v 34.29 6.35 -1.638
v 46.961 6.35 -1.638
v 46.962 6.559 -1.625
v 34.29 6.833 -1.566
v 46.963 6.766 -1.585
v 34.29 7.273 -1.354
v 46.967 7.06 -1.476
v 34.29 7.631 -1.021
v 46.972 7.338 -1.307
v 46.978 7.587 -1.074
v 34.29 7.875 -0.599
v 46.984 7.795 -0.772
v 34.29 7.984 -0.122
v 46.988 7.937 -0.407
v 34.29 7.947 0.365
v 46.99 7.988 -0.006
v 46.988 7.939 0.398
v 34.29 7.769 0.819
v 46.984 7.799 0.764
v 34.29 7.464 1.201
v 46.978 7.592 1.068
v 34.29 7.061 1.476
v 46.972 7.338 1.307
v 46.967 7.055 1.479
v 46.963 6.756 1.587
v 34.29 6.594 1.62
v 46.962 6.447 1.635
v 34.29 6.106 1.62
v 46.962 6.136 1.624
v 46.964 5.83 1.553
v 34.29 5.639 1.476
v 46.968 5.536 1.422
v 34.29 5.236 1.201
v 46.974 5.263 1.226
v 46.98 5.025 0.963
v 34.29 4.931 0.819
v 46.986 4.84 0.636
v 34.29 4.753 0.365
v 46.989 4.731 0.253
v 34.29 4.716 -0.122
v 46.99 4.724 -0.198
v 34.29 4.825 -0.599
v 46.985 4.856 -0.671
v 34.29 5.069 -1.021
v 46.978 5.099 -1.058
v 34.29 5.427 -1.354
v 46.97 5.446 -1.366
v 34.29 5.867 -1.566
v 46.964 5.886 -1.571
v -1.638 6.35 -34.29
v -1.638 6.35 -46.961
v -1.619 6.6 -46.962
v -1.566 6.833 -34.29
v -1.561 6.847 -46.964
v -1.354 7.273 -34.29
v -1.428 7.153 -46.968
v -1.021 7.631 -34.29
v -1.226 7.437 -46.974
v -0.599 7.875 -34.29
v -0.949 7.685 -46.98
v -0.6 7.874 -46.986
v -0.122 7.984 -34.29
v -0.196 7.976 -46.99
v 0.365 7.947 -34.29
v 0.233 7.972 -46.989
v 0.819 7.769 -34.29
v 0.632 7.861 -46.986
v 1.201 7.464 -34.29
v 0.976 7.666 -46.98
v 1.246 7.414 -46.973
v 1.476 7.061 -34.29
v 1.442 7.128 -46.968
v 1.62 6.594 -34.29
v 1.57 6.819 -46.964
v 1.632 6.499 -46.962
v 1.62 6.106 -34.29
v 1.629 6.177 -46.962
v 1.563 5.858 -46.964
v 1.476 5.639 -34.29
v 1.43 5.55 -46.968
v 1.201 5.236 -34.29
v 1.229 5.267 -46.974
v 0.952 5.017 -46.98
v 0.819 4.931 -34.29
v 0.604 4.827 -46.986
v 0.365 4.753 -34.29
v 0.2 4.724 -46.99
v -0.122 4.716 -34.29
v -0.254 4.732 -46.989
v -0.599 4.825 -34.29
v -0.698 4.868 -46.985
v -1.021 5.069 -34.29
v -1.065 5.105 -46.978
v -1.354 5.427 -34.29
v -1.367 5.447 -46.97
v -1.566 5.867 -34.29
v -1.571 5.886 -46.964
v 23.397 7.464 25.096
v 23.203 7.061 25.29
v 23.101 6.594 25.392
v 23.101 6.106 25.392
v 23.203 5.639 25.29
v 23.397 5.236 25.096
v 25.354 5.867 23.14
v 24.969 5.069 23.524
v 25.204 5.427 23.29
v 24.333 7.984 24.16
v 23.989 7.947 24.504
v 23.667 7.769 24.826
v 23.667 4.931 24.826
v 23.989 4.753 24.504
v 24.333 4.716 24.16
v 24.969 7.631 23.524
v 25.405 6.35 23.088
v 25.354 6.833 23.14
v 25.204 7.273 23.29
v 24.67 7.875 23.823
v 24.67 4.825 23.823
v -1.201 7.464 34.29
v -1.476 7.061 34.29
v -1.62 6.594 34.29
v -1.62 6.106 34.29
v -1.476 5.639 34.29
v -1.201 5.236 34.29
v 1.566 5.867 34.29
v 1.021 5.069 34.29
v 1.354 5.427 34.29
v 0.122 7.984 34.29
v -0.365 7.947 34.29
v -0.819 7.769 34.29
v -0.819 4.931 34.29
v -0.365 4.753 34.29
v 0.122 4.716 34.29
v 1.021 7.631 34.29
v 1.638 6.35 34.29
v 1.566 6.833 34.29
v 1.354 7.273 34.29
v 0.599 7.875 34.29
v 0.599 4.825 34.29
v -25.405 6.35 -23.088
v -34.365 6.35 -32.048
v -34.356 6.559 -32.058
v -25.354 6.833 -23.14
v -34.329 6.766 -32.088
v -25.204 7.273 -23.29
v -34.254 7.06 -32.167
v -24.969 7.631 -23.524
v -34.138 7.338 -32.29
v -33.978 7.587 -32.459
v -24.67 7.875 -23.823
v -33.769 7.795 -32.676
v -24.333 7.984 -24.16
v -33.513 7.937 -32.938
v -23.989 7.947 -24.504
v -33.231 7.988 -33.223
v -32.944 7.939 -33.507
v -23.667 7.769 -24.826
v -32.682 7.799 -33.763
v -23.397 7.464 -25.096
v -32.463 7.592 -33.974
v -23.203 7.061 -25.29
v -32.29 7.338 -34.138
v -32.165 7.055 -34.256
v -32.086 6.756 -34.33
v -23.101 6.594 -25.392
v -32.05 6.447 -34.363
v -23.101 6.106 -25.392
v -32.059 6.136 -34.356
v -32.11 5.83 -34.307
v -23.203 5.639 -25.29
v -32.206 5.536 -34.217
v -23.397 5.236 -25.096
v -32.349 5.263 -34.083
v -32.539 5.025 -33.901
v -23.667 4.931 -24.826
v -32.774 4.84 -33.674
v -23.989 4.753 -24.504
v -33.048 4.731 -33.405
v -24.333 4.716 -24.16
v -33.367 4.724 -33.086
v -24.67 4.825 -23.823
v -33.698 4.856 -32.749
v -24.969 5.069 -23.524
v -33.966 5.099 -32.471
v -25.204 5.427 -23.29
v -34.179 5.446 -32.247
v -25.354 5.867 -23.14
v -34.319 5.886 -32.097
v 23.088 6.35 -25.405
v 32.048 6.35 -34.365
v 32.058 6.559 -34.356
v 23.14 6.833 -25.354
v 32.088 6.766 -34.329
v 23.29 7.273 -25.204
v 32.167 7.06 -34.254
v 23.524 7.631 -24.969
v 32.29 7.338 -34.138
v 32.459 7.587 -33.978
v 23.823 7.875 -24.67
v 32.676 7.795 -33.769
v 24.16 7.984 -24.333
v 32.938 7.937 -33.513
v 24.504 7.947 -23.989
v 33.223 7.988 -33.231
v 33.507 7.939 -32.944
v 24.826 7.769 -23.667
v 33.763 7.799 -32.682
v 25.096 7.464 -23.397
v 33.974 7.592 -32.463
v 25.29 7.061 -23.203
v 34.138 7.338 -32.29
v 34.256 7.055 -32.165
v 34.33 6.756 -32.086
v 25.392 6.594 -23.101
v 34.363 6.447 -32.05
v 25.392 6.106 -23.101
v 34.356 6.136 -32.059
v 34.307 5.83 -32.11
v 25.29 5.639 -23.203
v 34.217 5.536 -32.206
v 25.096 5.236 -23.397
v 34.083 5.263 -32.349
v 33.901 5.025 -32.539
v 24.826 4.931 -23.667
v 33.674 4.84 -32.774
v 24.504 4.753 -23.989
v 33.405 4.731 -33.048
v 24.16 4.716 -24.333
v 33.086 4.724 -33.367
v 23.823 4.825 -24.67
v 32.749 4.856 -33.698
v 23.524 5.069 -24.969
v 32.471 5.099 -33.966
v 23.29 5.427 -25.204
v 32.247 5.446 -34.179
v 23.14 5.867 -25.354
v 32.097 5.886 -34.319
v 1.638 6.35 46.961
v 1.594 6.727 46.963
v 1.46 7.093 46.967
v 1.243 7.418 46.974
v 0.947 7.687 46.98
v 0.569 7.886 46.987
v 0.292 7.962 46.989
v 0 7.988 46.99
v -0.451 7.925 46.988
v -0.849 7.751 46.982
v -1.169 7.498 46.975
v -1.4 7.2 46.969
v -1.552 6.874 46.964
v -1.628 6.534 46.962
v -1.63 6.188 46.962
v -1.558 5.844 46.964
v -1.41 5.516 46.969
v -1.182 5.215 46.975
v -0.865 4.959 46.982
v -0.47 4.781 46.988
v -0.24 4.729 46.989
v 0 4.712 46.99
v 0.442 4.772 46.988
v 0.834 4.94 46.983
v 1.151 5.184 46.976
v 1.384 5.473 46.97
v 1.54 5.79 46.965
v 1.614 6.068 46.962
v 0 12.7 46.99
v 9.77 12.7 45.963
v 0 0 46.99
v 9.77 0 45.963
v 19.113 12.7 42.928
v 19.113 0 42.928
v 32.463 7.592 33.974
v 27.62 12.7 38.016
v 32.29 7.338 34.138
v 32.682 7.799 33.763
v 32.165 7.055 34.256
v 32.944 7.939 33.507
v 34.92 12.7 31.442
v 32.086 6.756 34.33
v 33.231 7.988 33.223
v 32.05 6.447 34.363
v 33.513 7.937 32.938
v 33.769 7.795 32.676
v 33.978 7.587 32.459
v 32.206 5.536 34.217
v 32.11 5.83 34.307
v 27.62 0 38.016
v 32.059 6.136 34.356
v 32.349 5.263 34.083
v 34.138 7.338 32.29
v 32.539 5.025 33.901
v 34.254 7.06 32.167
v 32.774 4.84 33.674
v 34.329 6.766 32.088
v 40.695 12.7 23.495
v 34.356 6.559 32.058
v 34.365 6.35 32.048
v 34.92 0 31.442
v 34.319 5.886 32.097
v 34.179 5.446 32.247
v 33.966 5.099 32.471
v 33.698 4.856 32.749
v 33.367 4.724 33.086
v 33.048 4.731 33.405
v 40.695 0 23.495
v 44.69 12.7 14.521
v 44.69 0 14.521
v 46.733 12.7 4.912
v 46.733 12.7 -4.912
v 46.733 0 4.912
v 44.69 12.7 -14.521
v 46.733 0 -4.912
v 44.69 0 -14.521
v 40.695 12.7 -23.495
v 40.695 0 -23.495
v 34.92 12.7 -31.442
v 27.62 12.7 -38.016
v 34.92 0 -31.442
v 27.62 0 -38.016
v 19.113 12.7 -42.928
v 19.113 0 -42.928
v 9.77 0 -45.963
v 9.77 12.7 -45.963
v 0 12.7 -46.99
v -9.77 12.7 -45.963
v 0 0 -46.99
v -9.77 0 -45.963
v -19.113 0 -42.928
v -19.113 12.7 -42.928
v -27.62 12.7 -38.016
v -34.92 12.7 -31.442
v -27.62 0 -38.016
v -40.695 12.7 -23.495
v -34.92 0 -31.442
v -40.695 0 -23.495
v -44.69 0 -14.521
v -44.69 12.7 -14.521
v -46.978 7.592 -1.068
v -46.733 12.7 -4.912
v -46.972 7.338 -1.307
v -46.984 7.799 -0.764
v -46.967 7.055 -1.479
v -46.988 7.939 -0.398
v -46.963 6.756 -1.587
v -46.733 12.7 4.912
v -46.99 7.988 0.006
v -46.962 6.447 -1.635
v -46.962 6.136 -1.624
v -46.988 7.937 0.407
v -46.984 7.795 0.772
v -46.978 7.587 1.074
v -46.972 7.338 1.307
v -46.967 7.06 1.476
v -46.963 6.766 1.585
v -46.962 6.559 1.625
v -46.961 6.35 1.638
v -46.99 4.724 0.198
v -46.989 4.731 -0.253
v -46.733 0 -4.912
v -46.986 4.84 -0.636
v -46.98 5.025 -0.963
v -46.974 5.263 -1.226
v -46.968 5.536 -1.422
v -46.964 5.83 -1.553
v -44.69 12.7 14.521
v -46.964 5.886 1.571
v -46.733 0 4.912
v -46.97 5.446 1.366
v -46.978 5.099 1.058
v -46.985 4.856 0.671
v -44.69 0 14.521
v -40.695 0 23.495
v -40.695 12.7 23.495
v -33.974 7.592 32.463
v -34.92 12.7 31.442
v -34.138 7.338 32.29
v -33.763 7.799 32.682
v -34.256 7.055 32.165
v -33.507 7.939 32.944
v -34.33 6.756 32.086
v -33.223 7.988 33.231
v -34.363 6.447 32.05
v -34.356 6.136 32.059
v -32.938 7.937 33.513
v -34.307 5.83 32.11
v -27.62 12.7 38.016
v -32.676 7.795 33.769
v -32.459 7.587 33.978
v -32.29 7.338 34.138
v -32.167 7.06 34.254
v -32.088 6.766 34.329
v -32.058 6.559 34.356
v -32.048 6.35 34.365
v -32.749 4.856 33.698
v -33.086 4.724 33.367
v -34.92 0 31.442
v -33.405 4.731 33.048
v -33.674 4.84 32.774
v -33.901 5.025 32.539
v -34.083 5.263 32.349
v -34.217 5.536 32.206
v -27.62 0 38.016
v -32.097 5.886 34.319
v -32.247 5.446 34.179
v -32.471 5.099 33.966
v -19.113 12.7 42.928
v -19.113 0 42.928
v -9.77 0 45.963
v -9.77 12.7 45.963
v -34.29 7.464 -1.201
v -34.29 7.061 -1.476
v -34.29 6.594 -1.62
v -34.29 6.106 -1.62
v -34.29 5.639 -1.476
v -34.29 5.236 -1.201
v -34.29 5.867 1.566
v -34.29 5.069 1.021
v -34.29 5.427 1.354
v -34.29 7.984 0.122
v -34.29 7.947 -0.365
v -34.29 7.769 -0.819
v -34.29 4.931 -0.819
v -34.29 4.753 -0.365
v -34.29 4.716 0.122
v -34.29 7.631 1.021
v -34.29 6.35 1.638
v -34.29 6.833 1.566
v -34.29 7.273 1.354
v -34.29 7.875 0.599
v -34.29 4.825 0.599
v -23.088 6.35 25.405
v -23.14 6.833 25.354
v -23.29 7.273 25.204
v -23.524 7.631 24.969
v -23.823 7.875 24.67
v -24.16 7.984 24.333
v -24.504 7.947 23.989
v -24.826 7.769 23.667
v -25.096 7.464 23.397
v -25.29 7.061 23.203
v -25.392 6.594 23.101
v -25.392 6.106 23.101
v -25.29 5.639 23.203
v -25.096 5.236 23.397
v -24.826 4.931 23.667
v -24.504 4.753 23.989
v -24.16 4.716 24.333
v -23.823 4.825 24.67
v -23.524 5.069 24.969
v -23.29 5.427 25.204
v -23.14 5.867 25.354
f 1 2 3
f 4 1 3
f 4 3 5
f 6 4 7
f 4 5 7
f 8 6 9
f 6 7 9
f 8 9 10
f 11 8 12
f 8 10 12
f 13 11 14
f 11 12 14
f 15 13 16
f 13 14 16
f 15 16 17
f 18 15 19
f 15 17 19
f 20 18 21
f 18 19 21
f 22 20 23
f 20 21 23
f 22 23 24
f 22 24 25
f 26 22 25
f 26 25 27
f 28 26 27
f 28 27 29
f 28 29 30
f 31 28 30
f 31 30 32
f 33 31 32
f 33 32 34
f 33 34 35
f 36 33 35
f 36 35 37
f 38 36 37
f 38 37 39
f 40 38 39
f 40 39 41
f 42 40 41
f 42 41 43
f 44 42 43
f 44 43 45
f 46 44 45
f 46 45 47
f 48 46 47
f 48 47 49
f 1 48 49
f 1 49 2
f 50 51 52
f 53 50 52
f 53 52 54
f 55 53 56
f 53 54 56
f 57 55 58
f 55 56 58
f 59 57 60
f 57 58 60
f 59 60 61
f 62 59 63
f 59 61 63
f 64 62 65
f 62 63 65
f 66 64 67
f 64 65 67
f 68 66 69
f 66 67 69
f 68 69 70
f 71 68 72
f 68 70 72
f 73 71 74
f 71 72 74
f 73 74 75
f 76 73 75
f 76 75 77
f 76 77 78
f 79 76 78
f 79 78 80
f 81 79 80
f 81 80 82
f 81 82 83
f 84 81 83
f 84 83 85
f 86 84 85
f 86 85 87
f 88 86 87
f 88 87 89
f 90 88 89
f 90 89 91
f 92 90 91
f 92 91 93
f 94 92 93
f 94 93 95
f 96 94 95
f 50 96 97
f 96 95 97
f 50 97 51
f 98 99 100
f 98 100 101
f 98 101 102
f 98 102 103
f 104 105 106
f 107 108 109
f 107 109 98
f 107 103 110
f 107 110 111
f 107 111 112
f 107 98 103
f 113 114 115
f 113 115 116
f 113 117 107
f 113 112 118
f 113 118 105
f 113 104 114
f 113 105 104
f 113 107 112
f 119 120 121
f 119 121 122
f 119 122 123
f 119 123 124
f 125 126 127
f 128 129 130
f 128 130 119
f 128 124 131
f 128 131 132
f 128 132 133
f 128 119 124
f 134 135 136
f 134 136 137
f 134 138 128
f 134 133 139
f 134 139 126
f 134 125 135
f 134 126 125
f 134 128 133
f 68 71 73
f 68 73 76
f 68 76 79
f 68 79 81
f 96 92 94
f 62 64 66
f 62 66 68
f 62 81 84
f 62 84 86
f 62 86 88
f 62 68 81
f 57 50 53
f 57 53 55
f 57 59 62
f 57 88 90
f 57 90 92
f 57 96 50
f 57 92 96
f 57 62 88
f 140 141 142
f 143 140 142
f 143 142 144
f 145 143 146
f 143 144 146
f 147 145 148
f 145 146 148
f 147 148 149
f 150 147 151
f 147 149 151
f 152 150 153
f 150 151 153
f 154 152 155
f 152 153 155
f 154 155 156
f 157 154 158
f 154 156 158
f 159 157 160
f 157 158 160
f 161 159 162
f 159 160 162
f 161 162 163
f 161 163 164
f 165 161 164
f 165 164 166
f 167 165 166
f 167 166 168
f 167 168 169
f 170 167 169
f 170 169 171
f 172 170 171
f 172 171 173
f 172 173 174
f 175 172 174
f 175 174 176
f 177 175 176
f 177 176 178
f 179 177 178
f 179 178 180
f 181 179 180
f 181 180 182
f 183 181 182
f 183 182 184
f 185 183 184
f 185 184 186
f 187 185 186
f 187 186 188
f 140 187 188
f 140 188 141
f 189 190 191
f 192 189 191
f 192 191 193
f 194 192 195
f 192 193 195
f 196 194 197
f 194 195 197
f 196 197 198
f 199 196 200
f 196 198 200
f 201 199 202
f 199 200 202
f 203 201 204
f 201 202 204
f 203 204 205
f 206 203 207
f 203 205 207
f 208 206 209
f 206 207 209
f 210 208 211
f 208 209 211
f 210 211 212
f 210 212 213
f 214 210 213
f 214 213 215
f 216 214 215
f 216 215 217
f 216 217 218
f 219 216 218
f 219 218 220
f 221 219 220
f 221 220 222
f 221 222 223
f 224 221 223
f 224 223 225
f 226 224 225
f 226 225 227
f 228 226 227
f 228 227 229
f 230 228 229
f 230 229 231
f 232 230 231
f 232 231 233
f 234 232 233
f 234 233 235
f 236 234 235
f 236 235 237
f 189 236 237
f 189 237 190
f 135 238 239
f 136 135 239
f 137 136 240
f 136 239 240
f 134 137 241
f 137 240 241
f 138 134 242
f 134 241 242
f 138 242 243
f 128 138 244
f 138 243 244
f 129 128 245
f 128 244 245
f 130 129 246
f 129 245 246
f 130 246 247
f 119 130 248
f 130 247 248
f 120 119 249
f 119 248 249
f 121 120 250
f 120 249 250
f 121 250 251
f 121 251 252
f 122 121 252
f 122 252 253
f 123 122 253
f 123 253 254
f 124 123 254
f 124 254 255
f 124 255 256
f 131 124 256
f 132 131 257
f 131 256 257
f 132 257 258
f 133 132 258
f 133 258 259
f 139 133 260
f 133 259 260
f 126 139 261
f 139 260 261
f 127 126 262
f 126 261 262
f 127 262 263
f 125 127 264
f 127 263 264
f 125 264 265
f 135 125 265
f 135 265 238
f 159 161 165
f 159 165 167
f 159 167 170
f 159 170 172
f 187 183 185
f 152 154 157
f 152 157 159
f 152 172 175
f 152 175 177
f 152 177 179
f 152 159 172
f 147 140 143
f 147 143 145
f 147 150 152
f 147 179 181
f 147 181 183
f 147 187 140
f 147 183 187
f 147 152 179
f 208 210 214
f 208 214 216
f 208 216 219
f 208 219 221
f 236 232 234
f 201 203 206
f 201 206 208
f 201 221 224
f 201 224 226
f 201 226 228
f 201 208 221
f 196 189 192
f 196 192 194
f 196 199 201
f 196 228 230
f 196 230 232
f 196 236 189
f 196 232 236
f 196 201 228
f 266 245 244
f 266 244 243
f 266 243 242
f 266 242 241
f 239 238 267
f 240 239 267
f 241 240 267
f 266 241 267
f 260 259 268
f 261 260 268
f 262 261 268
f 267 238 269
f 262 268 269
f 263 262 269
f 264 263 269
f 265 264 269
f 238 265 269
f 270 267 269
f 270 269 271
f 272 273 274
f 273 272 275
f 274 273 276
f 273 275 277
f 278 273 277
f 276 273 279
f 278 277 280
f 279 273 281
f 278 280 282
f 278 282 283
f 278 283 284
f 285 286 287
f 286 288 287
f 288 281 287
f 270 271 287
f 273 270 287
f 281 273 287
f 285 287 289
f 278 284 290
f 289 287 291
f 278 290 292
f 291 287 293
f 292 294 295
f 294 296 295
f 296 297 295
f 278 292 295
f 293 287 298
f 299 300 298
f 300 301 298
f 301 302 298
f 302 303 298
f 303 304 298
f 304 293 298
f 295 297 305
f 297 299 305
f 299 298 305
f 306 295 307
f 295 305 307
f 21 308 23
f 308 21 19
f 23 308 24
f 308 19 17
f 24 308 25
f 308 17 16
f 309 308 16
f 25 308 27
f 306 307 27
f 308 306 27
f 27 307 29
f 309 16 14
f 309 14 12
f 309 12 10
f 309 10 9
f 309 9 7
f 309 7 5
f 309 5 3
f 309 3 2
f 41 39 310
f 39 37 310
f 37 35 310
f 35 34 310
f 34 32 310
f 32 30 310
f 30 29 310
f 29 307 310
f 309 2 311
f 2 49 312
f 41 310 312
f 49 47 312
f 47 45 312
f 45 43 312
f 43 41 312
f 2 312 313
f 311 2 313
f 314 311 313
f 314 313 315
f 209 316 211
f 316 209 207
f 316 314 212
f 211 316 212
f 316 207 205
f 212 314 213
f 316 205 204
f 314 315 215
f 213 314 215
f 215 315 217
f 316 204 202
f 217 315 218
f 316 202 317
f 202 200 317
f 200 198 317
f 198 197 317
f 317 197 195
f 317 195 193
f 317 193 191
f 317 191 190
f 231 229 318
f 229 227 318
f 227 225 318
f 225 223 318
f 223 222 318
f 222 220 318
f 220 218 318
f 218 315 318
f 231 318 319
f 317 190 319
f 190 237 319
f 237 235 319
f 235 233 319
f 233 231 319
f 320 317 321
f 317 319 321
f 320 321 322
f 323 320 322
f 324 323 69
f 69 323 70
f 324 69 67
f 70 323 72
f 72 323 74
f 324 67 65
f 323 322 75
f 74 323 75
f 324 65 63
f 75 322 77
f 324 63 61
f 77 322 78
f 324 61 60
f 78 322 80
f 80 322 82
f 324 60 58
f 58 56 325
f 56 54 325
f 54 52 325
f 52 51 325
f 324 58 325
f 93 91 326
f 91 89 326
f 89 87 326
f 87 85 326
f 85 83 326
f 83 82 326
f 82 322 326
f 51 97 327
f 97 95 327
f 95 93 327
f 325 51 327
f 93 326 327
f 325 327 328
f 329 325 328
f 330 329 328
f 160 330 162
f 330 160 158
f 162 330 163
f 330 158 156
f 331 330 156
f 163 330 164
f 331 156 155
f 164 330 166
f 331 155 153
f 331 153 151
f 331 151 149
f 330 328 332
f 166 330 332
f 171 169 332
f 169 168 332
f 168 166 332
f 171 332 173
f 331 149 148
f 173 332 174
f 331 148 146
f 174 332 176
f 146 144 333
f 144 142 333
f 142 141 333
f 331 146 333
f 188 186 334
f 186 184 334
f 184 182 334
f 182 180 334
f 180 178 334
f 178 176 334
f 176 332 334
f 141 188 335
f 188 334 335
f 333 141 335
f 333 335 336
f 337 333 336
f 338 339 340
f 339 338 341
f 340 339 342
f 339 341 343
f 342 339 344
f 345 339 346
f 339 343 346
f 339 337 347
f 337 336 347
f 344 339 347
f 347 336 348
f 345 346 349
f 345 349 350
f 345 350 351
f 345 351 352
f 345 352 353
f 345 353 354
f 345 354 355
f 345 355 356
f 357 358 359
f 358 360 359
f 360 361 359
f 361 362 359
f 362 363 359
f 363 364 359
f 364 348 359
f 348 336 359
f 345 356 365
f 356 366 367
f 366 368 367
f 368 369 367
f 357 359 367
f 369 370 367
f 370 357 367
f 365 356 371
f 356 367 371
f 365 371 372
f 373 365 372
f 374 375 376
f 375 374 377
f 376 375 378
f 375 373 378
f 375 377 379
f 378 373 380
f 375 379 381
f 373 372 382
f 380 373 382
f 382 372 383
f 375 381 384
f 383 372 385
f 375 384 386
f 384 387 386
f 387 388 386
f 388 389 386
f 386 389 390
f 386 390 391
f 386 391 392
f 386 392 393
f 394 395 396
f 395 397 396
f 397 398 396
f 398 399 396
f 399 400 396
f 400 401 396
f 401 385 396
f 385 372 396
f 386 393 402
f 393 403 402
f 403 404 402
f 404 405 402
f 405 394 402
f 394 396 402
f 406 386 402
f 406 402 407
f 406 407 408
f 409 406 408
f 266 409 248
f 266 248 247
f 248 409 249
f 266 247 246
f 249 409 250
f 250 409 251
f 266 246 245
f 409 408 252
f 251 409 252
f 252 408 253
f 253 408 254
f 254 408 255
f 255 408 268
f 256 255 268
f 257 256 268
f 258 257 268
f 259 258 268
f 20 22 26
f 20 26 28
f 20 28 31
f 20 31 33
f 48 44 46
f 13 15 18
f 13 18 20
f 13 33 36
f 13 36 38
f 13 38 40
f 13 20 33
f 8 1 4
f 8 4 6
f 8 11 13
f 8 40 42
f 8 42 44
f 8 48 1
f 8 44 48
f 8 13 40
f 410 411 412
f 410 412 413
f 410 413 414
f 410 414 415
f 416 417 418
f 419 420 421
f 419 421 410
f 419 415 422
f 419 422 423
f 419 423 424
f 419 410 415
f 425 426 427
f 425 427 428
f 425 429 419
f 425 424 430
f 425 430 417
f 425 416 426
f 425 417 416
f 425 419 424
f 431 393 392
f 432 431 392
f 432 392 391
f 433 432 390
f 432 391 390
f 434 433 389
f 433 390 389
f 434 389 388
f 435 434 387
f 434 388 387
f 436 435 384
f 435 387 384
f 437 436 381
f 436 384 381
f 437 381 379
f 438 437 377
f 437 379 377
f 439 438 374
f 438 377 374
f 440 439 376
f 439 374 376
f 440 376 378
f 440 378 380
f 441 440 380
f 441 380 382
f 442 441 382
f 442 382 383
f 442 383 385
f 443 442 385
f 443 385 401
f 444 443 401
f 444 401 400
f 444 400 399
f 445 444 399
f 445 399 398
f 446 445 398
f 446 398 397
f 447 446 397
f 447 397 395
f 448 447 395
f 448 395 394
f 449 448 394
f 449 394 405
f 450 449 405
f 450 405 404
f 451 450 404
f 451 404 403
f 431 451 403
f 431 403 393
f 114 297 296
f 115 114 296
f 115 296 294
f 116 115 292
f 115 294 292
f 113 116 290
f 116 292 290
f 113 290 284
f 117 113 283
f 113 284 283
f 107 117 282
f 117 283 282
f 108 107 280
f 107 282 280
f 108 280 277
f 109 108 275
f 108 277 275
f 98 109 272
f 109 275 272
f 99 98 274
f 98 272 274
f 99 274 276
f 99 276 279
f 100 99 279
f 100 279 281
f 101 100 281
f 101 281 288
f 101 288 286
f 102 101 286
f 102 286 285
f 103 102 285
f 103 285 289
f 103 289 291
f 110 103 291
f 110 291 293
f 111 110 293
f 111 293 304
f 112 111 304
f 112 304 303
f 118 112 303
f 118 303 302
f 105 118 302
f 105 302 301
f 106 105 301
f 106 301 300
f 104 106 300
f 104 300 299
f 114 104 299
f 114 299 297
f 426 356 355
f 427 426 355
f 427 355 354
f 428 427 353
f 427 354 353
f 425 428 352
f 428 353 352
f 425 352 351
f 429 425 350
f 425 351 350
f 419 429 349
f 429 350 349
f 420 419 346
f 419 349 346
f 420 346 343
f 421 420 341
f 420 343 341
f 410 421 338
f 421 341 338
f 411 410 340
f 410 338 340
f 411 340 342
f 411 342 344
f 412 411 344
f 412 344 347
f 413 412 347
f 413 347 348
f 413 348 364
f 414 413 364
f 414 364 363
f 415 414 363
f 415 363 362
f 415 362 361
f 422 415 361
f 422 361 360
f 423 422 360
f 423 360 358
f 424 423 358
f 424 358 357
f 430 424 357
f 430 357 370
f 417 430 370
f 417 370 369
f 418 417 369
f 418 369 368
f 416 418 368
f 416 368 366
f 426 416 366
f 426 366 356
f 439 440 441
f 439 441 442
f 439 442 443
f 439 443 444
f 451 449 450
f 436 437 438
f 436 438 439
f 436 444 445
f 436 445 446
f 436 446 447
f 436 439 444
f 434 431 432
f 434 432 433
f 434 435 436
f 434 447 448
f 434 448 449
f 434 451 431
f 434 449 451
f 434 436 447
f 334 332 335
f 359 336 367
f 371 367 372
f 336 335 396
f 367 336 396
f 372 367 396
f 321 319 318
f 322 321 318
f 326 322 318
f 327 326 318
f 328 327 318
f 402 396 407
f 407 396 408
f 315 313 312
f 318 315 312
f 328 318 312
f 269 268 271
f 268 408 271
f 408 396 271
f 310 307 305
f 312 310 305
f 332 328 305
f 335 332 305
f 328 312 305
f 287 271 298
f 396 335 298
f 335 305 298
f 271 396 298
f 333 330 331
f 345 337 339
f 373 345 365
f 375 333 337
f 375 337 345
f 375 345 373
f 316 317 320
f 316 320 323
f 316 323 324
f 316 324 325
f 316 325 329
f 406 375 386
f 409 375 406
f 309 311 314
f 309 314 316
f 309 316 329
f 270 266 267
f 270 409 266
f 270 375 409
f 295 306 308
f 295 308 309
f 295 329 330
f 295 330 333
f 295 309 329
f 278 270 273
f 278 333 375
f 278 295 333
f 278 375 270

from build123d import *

# Parameters (mm, degrees)
SKETCH1_R                = 46.99
BULKHEAD_EXTRUSION_DEPTH = 12.7
SKETCH2_R                = 1.6383
SCREW_HOLE_DEPTH         = 12.7
CIRPATTERN1_COUNT        = 8


with BuildPart() as part:
    # Sketch1 → Bulkhead Extrusion (new body)
    with BuildSketch(Plane(origin=(0, 0, 0), x_dir=(1, 0, 0), z_dir=(0, 1, 0))):
        with Locations(Location((0, 0, 0), (0, 0, 270))):
            Circle(SKETCH1_R)
    extrude(amount=BULKHEAD_EXTRUSION_DEPTH)

    # Sketch2 → Screw Hole (cut)
    with BuildSketch(Plane.XY.offset(46.99)):
        with Locations((0, 6.35)):
            Circle(SKETCH2_R)
    screw_hole = extrude(amount=-SCREW_HOLE_DEPTH, mode=Mode.SUBTRACT)

    # CirPattern1: Screw Hole ×8 about axis
    cirpattern1_axis = Axis((0, 0, 0), (0, 1, 0))
    for i in range(1, CIRPATTERN1_COUNT):
        add(screw_hole.rotate(cirpattern1_axis, i * 360 / CIRPATTERN1_COUNT), mode=Mode.SUBTRACT)


solid = part.part
